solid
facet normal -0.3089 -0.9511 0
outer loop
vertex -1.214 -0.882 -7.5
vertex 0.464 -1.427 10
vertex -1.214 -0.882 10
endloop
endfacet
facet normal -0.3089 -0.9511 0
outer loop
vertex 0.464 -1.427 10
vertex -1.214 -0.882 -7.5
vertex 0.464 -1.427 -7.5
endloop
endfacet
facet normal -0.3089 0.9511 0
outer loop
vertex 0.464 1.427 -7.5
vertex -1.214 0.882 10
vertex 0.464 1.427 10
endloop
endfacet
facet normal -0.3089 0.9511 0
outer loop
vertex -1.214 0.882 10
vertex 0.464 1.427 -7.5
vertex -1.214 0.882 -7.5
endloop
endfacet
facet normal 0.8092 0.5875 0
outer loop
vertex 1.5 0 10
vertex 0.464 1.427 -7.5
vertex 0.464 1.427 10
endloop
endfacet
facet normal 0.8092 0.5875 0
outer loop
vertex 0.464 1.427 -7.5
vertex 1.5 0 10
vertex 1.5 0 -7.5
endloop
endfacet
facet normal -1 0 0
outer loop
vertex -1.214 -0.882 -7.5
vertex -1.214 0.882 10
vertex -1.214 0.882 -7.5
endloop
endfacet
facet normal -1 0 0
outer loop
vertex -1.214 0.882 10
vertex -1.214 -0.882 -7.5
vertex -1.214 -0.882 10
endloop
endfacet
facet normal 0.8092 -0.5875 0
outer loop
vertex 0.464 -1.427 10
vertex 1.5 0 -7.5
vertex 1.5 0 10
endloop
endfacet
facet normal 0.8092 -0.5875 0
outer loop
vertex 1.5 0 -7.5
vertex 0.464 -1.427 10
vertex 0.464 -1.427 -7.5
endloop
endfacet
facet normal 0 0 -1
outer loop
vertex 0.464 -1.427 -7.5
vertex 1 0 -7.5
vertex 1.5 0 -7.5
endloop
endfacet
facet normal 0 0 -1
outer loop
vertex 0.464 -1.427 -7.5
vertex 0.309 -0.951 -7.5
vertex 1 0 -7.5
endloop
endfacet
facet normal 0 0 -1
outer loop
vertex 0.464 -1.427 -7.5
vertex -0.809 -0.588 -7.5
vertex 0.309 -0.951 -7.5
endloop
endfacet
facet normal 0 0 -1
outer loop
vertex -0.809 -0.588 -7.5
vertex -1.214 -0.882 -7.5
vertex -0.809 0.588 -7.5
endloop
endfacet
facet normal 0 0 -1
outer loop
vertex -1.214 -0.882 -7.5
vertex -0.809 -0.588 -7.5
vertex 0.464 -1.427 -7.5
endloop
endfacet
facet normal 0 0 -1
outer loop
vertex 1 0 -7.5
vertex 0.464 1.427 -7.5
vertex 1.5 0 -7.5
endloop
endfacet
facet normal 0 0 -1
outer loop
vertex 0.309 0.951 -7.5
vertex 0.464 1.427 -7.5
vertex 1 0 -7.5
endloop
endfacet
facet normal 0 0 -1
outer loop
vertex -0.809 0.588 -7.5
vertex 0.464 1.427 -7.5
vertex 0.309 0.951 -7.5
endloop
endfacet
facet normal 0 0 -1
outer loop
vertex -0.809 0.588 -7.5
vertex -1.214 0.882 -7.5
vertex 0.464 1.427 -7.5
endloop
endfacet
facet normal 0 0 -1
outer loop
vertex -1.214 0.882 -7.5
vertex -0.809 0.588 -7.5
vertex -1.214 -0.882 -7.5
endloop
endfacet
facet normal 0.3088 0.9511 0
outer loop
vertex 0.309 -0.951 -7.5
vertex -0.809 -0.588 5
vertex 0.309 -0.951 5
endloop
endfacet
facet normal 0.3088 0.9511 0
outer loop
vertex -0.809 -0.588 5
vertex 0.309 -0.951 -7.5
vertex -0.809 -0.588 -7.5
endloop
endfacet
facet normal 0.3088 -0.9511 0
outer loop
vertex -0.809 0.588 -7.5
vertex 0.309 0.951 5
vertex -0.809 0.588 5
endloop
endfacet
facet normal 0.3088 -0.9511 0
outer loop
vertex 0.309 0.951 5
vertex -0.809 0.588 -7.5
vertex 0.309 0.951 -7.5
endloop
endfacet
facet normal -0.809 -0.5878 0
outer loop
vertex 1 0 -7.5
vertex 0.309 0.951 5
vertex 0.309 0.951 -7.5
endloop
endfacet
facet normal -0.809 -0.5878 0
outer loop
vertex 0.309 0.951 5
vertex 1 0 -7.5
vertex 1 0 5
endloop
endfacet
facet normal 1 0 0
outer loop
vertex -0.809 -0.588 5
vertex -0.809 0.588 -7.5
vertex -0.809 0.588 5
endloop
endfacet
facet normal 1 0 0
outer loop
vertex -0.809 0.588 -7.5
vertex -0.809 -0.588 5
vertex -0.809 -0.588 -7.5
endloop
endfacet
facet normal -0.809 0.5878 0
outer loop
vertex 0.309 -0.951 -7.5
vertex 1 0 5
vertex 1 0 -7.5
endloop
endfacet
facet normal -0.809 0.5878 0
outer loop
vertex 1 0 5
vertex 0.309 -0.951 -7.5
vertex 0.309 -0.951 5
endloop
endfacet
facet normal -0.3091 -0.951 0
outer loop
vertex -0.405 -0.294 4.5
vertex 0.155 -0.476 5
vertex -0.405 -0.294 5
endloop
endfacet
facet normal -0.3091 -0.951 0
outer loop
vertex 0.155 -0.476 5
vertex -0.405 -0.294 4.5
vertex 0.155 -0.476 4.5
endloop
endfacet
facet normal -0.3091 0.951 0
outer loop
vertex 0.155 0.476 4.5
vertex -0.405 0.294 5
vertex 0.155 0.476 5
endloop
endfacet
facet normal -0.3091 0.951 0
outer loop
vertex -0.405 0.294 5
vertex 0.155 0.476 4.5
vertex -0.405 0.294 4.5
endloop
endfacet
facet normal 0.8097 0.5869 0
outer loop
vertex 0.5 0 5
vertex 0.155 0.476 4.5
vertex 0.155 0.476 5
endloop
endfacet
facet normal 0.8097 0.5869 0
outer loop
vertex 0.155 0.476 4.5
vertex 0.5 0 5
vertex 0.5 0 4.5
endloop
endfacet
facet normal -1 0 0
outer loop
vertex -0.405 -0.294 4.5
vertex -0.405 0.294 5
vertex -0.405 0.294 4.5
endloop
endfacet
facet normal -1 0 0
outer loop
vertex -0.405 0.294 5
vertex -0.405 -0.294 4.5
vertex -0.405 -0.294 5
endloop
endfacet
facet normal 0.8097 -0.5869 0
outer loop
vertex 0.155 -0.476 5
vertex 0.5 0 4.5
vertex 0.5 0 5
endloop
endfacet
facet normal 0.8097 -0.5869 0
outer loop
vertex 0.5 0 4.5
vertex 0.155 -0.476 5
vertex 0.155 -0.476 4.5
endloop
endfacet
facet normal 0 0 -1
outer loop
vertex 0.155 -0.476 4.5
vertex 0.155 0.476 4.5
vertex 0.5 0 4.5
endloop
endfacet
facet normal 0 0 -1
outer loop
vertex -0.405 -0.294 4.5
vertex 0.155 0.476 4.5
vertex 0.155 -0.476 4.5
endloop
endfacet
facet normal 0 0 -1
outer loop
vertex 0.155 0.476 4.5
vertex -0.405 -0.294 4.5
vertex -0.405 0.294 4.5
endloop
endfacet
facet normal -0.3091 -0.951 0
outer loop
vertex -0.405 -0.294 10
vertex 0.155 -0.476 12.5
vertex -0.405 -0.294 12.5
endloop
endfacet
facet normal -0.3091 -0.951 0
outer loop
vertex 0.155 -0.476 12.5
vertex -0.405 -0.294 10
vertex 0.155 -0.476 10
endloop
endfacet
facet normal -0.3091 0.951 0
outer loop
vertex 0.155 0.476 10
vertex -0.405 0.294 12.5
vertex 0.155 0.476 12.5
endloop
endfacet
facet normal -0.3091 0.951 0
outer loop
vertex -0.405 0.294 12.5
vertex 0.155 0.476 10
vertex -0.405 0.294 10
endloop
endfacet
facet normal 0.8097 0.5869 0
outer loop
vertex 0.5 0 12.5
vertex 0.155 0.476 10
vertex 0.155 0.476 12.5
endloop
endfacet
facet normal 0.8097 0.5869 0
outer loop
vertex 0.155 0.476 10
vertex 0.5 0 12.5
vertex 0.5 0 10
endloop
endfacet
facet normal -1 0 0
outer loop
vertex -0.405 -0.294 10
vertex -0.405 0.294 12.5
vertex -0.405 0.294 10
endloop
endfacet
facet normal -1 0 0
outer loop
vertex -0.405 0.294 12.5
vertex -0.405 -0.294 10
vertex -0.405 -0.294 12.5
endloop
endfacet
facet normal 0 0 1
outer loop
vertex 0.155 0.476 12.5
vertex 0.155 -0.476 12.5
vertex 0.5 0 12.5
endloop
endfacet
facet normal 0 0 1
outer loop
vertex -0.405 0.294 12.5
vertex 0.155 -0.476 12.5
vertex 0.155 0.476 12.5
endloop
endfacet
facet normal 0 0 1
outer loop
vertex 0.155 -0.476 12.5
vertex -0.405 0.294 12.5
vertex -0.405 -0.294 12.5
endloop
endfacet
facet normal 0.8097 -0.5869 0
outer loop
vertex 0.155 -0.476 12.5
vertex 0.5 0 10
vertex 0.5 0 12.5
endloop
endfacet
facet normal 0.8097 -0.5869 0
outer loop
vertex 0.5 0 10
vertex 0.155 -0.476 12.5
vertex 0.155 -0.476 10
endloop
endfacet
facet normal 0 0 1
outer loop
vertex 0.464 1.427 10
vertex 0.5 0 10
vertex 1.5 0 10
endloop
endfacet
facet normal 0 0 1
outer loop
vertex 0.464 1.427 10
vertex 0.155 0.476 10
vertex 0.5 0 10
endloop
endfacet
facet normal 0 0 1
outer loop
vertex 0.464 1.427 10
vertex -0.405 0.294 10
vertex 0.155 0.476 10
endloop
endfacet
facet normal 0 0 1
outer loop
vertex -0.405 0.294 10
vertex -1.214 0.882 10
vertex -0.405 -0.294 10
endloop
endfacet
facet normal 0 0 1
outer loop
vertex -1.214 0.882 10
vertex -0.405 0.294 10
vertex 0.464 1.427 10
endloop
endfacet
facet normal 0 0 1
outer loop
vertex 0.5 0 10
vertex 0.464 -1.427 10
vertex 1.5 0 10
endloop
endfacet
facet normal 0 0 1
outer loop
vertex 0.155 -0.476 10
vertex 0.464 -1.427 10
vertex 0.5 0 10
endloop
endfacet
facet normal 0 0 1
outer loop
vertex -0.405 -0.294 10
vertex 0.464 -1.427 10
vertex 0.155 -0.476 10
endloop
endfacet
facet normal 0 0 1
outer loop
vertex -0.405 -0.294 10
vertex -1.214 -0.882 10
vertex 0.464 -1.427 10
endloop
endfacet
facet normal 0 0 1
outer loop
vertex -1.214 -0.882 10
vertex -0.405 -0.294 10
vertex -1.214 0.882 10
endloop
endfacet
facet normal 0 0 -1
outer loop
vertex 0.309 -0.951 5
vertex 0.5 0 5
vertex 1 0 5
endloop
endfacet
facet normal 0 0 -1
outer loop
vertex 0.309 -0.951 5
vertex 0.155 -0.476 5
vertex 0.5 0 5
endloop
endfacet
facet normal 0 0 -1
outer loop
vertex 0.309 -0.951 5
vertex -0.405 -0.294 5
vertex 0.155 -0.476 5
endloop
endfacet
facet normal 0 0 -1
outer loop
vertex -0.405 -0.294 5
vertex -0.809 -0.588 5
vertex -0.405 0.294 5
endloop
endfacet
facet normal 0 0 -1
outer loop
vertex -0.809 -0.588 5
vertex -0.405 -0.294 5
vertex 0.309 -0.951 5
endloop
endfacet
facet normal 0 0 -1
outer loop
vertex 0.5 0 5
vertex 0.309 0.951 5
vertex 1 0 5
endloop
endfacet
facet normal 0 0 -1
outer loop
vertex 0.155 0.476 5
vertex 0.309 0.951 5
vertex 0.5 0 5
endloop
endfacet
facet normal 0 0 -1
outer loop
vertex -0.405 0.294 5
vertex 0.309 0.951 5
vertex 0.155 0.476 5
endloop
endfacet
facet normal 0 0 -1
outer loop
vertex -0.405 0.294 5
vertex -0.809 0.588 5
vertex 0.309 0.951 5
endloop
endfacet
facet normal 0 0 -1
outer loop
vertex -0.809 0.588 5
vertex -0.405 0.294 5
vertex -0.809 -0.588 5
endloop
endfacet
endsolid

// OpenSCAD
// Parameters
length = 15; //[8:30:1]
forced_id = 0; //[0:10:1]
center = 1; //[0:1:1]
default_id = 2; //[1:6:0.5]
wall_thickness = 0.5; //[0.25:1.5:0.05]
overlap = 1; //[0.5:2:0.1]

// Tubing - complete geometry
module tubing() {
  color([0.85, 0.85, 0.8]) { // Off-white for PTFE
    difference() {
      // Outer tube
      cylinder(
        r=((forced_id > 0) ? forced_id : default_id) / 2 + wall_thickness,
        h=length,
        center=true
      );
      // Inner bore
      cylinder(
        r=((forced_id > 0) ? forced_id : default_id) / 2,
        h=length + 2 * overlap,
        center=true
      );
    }
  }
}

// Sleeved Resistor - complete geometry
module sleeved_resistor() {
  color([0.2, 0.2, 0.2]) { // Dark color for resistor body
    // Resistor body
    cylinder(r=1.5, h=5, center=true);
    // Resistor leads
    color("Silver") {
      translate([0, 0, -3]) cylinder(r=0.5, h=3, center=false);
      translate([0, 0, 2]) cylinder(r=0.5, h=3, center=false);
    }
  }
}

// Assembly
module assembly() {
  translate([0, 0, ((center > 0) ? 0 : length / 2)]) tubing();
  translate([0, 0, ((center > 0) ? 0 : length / 2) + 7.5]) sleeved_resistor();
}

assembly();
